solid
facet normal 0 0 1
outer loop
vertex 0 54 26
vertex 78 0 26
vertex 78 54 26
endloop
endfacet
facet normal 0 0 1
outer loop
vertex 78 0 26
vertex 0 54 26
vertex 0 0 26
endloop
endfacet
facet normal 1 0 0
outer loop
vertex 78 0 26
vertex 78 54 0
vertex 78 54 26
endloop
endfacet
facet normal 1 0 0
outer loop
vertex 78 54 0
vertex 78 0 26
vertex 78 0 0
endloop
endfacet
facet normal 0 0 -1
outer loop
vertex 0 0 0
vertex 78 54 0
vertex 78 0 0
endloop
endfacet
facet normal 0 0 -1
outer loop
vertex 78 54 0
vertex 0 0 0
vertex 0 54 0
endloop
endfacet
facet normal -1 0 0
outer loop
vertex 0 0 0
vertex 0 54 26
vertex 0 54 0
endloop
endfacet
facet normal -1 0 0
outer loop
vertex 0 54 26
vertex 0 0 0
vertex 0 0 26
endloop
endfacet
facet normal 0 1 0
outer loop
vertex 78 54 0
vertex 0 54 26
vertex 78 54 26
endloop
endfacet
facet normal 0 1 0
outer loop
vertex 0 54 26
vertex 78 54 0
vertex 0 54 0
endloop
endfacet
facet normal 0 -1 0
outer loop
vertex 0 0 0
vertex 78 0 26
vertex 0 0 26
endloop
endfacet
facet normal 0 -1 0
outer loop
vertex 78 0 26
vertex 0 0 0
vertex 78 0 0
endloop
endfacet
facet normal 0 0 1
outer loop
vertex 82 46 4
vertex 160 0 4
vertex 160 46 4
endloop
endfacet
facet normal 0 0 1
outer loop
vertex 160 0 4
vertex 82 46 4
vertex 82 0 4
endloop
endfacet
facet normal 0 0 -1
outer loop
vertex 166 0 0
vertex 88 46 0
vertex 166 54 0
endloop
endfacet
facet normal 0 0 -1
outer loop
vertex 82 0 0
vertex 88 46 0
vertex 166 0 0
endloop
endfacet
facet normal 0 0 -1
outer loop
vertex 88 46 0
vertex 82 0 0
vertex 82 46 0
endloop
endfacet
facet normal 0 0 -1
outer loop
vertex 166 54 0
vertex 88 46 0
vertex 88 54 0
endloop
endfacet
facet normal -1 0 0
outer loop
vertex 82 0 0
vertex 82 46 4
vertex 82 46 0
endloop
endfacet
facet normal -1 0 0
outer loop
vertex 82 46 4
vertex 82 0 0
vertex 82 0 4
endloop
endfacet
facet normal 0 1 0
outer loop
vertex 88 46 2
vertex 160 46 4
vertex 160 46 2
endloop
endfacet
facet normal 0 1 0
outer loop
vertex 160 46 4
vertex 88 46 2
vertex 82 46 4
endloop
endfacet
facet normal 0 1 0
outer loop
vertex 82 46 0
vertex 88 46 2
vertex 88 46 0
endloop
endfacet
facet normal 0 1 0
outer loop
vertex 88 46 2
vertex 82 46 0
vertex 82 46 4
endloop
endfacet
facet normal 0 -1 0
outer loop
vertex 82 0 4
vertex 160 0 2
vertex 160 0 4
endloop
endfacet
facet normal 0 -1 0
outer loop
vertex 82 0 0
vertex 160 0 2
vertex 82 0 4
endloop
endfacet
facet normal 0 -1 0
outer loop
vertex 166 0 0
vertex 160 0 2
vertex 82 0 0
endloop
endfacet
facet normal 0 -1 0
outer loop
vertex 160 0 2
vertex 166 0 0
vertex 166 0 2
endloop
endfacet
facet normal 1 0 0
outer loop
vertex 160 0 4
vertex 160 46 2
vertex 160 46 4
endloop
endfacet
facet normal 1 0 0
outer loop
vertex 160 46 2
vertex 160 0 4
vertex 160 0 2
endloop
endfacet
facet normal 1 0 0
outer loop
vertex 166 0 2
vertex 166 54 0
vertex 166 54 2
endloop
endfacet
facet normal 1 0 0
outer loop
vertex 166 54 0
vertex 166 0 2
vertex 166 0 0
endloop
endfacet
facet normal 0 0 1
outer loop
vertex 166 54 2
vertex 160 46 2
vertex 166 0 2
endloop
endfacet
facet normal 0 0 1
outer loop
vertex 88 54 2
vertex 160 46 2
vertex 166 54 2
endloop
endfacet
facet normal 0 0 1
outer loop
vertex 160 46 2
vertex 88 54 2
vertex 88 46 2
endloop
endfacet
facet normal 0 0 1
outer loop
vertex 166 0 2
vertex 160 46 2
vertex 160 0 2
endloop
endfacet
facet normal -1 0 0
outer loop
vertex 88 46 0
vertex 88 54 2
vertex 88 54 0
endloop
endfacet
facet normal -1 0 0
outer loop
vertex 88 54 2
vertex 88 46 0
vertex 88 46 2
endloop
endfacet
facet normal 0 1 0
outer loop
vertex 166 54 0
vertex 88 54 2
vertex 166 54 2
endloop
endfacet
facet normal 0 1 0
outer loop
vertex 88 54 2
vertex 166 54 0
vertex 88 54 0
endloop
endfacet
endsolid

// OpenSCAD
// Two-part enclosure for a small electronics board (e.g. an Arduino-based temperature logger).
// The file models both parts side by side with a 10 mm gap so they print in one go.
// Part 1: the box - an open-top box with a solid floor, walls and a top rim (open top).
// Part 2: the lid, printed upside down - a plate with a rectangular lip on its top surface that
// slides into the box opening with a small clearance. The two parts are laid next to each other
// on the build bed with a 10 mm gap between them.

box_d  = 70;
box_y  = 50;
box_h  = 30;
wall   = 2;
floor  = 2;

lip_d  = 65.6;
lip_y  = 45.6;
lip_h  = 4;
clear  = 0.2;

$fn = 48;

ol     = box_d + 2 * wall + 2 * floor;
oy     = box_y + 2 * wall;
ol_h   = box_h - floor;

// Rigidly position the two parts with a 10 mm gap between them, both resting on the bed (z = 0).
gap    = 10;

translate([0, 0, 0]) {
    difference() {
        cube([ol, oy, ol_h]);                 // box body, open top
        translate([0, 0, ol_h - floor]) cube([ol, oy, floor]);          // solid floor
        for (x = [-1, 1])
            translate([x * (ol / 2 - lip_d / 2 - clear), 0, ol_h - floor])
                cube([lip_d + 2 * clear, lip_y + 2 * clear, lip_h]);    // two lips, open downward
    }
}

translate([ol + gap, 0, 0]) {
    union() {
        cube([ol, oy, 2]);                   // base plate
        for (x = [-1, 1])
            translate([x * (ol / 2 - lip_d / 2 - clear), 0, 0])
                cube([lip_d + 2 * clear, lip_y + 2 * clear, lip_h]);    // two lips upward
    }
}
